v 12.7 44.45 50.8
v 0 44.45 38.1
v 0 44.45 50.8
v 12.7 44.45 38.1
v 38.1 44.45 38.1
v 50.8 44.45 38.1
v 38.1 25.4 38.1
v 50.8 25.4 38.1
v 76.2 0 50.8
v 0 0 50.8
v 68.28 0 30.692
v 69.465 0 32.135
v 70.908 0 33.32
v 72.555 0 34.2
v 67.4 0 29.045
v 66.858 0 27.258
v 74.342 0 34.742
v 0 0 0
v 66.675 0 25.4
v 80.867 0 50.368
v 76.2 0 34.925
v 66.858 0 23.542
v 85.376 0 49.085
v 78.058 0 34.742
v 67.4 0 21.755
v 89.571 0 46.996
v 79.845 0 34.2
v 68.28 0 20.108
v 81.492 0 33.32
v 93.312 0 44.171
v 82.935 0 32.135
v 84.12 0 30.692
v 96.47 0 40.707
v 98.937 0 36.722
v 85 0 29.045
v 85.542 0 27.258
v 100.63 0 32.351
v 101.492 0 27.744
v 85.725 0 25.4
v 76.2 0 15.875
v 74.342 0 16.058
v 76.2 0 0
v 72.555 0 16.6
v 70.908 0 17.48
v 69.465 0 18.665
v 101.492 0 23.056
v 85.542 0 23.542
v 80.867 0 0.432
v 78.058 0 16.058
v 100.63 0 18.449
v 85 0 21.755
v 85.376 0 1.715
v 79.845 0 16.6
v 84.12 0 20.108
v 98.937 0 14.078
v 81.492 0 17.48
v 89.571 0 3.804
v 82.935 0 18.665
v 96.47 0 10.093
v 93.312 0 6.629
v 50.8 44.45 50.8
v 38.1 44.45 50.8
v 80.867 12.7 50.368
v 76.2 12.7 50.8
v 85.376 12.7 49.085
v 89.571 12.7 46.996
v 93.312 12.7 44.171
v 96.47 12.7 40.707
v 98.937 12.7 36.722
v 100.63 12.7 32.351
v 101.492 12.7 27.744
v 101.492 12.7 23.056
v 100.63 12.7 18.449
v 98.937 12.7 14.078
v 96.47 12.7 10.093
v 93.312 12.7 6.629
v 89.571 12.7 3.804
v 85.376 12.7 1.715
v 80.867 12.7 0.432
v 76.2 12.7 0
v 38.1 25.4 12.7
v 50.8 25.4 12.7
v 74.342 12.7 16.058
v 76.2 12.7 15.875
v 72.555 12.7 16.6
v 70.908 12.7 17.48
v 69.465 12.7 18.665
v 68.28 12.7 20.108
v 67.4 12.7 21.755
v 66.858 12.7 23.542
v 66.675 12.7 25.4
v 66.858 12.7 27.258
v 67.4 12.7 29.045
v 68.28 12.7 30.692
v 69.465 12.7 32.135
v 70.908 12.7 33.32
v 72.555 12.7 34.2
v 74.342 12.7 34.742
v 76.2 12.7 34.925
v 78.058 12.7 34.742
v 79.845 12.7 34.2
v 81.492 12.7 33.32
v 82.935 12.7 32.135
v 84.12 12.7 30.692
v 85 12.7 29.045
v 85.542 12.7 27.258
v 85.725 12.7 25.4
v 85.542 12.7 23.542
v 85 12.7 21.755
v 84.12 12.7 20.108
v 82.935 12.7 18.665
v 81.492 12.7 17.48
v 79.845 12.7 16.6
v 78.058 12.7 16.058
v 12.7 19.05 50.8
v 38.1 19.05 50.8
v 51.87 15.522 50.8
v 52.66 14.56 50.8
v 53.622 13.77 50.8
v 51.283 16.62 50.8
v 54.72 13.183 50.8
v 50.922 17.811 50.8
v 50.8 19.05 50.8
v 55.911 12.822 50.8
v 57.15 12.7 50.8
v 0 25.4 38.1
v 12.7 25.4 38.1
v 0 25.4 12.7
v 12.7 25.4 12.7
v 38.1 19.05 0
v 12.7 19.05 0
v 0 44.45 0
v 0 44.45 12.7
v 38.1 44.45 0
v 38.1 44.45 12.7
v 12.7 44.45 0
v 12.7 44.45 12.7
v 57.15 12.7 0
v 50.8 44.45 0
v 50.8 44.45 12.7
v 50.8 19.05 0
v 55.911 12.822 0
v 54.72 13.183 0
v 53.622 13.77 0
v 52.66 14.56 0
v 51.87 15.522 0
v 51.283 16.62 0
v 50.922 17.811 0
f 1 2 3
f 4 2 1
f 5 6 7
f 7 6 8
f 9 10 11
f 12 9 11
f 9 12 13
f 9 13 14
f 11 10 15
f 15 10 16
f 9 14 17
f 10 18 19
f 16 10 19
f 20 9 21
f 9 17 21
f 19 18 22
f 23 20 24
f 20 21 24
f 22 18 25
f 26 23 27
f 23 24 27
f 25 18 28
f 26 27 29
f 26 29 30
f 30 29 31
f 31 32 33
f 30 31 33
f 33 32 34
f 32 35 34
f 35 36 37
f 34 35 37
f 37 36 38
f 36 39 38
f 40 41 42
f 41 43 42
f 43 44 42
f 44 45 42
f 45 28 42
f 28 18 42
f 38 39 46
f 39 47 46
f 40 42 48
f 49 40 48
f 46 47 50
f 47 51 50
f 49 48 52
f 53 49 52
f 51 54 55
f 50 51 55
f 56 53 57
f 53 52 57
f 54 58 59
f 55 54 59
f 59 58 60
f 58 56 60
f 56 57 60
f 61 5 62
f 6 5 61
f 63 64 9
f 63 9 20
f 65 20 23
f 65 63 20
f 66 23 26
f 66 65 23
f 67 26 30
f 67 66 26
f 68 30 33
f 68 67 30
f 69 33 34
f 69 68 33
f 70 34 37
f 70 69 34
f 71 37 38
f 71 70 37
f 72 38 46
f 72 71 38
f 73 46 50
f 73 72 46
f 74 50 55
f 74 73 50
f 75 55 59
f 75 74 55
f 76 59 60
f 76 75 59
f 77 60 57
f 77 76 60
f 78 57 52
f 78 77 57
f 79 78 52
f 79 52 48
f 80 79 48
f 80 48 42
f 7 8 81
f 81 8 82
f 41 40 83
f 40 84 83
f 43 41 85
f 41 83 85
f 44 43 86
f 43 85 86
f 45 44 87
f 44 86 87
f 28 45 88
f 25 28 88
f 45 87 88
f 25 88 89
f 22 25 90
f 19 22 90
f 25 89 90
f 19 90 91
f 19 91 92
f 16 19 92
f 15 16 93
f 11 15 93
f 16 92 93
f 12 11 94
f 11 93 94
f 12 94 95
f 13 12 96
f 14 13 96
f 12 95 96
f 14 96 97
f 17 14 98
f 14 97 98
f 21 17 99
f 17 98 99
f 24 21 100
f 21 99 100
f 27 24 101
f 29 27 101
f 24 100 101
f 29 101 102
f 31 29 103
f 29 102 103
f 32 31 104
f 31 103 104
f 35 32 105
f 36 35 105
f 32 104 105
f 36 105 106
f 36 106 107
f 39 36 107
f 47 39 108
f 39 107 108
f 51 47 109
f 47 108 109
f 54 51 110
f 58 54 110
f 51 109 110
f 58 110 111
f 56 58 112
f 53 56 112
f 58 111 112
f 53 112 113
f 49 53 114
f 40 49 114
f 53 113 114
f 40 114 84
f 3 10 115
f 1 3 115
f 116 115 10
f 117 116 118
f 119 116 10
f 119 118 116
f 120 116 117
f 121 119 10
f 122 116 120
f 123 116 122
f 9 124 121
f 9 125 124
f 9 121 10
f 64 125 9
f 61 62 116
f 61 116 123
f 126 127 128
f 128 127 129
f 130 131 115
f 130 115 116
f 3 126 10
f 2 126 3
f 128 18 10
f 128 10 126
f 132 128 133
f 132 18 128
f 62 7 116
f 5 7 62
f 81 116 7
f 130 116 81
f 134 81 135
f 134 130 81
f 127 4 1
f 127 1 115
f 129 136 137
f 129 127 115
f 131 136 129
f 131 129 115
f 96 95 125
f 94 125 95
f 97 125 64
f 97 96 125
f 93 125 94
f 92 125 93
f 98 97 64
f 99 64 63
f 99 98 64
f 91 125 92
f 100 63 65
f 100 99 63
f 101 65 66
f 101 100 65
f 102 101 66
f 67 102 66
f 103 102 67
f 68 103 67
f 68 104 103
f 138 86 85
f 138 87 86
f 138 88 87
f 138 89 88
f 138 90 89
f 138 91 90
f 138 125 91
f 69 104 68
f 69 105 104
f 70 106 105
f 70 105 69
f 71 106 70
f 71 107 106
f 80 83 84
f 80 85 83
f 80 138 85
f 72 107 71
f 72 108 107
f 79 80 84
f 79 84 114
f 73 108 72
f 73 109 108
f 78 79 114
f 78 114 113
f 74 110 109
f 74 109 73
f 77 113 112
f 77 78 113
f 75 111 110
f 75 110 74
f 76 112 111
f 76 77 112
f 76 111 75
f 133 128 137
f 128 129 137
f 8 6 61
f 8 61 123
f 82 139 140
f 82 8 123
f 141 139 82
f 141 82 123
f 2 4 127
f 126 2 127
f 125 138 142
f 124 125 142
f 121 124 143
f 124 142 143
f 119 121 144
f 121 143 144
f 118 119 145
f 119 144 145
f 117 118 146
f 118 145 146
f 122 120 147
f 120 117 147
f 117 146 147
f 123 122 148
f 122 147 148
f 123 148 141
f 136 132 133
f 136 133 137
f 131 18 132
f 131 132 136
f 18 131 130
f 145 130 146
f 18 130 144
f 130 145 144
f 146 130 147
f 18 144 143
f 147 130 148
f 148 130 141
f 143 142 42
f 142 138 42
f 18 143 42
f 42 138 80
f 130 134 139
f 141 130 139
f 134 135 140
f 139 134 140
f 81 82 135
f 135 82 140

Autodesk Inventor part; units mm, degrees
ref_plane "YZ Plane" through (0, 0, 0) normal (1, 0, 0) x (0, 1, 0)
ref_plane "XZ Plane" through (0, 0, 0) normal (0, 1, 0) x (-1, 0, 0)
ref_plane "XY Plane" through (0, 0, 0) normal (0, 0, 1) x (1, 0, 0)
sketch "Sketch1" plane through (0, 0, 0) normal (0, 0, 1) x (1, 0, 0)
  line L0 (0, 0) -> (76.2, 0)
  line L1 (76.2, 0) -> (76.2, 12.7)
  line L2 (0, 0) -> (0, 44.45)
  line L3 (0, 44.45) -> (12.7, 44.45)
  line L4 (12.7, 44.45) -> (12.7, 19.05)
  line L5 (12.7, 19.05) -> (38.1, 19.05)
  line L6 (38.1, 19.05) -> (38.1, 44.45)
  line L7 (38.1, 44.45) -> (50.8, 44.45)
  line L8 (50.8, 44.45) -> (50.8, 19.05)
  line L9 (57.15, 12.7) -> (76.2, 12.7)
  arc A0 (50.8, 19.05) -> (57.15, 12.7) centre (57.15, 19.05) ccw
  point P0 (50.8, 12.7)
  dimension "d1" = 12.7
  dimension "d2" = 44.45
  dimension "d3" = 12.7
  dimension "d6" = 12.7
  dimension "d7" = 76.2
  dimension "d8" = 50.8
  dimension "d9" = 19.05
  dimension "d28" = 6.35
extrude "Base" add sketch "Sketch1" along normal blind 50.8
sketch "Sketch2" plane through (50.8, 12.7, 0) normal (0, 1, 0) x (1, 0, 0)
  line L0 (25.4, 0) -> (25.4, -50.8) projected
  circle A0 centre (25.4, -25.4) radius 25.4
  point P0 (-50.8, 0)
extrude "Ciclre" add sketch "Sketch2" against normal blind 12.7
hole "Hole1" at (76.2, 0, 25.4) direction (0, 1, 0) diameter 19.05 end through all
sketch "Sketch4" plane through (50.8, 12.7, 0) normal (1, 0, 0) x (0, 0, -1)
  line L0 (-50.8, 31.75) -> (-38.1, 31.75)
  line L1 (0, 31.75) -> (-50.8, 31.75) projected
  line L2 (-38.1, 31.75) -> (-38.1, 12.7)
  line L3 (-38.1, 12.7) -> (-12.7, 12.7)
  line L4 (-12.7, 12.7) -> (-12.7, 31.75)
  line L5 (-38.1, 31.75) -> (-12.7, 31.75)
  line L6 (0, 31.75) -> (-50.8, 31.75) projected
  point P0 (0, -12.7)
  dimension "d23" = 12.7
  dimension "d24" = 19.05
  dimension "d25" = 25.4
extrude "Extrusion3" cut sketch "Sketch4" against normal through all
properties part number "tut" material "Titanium"
